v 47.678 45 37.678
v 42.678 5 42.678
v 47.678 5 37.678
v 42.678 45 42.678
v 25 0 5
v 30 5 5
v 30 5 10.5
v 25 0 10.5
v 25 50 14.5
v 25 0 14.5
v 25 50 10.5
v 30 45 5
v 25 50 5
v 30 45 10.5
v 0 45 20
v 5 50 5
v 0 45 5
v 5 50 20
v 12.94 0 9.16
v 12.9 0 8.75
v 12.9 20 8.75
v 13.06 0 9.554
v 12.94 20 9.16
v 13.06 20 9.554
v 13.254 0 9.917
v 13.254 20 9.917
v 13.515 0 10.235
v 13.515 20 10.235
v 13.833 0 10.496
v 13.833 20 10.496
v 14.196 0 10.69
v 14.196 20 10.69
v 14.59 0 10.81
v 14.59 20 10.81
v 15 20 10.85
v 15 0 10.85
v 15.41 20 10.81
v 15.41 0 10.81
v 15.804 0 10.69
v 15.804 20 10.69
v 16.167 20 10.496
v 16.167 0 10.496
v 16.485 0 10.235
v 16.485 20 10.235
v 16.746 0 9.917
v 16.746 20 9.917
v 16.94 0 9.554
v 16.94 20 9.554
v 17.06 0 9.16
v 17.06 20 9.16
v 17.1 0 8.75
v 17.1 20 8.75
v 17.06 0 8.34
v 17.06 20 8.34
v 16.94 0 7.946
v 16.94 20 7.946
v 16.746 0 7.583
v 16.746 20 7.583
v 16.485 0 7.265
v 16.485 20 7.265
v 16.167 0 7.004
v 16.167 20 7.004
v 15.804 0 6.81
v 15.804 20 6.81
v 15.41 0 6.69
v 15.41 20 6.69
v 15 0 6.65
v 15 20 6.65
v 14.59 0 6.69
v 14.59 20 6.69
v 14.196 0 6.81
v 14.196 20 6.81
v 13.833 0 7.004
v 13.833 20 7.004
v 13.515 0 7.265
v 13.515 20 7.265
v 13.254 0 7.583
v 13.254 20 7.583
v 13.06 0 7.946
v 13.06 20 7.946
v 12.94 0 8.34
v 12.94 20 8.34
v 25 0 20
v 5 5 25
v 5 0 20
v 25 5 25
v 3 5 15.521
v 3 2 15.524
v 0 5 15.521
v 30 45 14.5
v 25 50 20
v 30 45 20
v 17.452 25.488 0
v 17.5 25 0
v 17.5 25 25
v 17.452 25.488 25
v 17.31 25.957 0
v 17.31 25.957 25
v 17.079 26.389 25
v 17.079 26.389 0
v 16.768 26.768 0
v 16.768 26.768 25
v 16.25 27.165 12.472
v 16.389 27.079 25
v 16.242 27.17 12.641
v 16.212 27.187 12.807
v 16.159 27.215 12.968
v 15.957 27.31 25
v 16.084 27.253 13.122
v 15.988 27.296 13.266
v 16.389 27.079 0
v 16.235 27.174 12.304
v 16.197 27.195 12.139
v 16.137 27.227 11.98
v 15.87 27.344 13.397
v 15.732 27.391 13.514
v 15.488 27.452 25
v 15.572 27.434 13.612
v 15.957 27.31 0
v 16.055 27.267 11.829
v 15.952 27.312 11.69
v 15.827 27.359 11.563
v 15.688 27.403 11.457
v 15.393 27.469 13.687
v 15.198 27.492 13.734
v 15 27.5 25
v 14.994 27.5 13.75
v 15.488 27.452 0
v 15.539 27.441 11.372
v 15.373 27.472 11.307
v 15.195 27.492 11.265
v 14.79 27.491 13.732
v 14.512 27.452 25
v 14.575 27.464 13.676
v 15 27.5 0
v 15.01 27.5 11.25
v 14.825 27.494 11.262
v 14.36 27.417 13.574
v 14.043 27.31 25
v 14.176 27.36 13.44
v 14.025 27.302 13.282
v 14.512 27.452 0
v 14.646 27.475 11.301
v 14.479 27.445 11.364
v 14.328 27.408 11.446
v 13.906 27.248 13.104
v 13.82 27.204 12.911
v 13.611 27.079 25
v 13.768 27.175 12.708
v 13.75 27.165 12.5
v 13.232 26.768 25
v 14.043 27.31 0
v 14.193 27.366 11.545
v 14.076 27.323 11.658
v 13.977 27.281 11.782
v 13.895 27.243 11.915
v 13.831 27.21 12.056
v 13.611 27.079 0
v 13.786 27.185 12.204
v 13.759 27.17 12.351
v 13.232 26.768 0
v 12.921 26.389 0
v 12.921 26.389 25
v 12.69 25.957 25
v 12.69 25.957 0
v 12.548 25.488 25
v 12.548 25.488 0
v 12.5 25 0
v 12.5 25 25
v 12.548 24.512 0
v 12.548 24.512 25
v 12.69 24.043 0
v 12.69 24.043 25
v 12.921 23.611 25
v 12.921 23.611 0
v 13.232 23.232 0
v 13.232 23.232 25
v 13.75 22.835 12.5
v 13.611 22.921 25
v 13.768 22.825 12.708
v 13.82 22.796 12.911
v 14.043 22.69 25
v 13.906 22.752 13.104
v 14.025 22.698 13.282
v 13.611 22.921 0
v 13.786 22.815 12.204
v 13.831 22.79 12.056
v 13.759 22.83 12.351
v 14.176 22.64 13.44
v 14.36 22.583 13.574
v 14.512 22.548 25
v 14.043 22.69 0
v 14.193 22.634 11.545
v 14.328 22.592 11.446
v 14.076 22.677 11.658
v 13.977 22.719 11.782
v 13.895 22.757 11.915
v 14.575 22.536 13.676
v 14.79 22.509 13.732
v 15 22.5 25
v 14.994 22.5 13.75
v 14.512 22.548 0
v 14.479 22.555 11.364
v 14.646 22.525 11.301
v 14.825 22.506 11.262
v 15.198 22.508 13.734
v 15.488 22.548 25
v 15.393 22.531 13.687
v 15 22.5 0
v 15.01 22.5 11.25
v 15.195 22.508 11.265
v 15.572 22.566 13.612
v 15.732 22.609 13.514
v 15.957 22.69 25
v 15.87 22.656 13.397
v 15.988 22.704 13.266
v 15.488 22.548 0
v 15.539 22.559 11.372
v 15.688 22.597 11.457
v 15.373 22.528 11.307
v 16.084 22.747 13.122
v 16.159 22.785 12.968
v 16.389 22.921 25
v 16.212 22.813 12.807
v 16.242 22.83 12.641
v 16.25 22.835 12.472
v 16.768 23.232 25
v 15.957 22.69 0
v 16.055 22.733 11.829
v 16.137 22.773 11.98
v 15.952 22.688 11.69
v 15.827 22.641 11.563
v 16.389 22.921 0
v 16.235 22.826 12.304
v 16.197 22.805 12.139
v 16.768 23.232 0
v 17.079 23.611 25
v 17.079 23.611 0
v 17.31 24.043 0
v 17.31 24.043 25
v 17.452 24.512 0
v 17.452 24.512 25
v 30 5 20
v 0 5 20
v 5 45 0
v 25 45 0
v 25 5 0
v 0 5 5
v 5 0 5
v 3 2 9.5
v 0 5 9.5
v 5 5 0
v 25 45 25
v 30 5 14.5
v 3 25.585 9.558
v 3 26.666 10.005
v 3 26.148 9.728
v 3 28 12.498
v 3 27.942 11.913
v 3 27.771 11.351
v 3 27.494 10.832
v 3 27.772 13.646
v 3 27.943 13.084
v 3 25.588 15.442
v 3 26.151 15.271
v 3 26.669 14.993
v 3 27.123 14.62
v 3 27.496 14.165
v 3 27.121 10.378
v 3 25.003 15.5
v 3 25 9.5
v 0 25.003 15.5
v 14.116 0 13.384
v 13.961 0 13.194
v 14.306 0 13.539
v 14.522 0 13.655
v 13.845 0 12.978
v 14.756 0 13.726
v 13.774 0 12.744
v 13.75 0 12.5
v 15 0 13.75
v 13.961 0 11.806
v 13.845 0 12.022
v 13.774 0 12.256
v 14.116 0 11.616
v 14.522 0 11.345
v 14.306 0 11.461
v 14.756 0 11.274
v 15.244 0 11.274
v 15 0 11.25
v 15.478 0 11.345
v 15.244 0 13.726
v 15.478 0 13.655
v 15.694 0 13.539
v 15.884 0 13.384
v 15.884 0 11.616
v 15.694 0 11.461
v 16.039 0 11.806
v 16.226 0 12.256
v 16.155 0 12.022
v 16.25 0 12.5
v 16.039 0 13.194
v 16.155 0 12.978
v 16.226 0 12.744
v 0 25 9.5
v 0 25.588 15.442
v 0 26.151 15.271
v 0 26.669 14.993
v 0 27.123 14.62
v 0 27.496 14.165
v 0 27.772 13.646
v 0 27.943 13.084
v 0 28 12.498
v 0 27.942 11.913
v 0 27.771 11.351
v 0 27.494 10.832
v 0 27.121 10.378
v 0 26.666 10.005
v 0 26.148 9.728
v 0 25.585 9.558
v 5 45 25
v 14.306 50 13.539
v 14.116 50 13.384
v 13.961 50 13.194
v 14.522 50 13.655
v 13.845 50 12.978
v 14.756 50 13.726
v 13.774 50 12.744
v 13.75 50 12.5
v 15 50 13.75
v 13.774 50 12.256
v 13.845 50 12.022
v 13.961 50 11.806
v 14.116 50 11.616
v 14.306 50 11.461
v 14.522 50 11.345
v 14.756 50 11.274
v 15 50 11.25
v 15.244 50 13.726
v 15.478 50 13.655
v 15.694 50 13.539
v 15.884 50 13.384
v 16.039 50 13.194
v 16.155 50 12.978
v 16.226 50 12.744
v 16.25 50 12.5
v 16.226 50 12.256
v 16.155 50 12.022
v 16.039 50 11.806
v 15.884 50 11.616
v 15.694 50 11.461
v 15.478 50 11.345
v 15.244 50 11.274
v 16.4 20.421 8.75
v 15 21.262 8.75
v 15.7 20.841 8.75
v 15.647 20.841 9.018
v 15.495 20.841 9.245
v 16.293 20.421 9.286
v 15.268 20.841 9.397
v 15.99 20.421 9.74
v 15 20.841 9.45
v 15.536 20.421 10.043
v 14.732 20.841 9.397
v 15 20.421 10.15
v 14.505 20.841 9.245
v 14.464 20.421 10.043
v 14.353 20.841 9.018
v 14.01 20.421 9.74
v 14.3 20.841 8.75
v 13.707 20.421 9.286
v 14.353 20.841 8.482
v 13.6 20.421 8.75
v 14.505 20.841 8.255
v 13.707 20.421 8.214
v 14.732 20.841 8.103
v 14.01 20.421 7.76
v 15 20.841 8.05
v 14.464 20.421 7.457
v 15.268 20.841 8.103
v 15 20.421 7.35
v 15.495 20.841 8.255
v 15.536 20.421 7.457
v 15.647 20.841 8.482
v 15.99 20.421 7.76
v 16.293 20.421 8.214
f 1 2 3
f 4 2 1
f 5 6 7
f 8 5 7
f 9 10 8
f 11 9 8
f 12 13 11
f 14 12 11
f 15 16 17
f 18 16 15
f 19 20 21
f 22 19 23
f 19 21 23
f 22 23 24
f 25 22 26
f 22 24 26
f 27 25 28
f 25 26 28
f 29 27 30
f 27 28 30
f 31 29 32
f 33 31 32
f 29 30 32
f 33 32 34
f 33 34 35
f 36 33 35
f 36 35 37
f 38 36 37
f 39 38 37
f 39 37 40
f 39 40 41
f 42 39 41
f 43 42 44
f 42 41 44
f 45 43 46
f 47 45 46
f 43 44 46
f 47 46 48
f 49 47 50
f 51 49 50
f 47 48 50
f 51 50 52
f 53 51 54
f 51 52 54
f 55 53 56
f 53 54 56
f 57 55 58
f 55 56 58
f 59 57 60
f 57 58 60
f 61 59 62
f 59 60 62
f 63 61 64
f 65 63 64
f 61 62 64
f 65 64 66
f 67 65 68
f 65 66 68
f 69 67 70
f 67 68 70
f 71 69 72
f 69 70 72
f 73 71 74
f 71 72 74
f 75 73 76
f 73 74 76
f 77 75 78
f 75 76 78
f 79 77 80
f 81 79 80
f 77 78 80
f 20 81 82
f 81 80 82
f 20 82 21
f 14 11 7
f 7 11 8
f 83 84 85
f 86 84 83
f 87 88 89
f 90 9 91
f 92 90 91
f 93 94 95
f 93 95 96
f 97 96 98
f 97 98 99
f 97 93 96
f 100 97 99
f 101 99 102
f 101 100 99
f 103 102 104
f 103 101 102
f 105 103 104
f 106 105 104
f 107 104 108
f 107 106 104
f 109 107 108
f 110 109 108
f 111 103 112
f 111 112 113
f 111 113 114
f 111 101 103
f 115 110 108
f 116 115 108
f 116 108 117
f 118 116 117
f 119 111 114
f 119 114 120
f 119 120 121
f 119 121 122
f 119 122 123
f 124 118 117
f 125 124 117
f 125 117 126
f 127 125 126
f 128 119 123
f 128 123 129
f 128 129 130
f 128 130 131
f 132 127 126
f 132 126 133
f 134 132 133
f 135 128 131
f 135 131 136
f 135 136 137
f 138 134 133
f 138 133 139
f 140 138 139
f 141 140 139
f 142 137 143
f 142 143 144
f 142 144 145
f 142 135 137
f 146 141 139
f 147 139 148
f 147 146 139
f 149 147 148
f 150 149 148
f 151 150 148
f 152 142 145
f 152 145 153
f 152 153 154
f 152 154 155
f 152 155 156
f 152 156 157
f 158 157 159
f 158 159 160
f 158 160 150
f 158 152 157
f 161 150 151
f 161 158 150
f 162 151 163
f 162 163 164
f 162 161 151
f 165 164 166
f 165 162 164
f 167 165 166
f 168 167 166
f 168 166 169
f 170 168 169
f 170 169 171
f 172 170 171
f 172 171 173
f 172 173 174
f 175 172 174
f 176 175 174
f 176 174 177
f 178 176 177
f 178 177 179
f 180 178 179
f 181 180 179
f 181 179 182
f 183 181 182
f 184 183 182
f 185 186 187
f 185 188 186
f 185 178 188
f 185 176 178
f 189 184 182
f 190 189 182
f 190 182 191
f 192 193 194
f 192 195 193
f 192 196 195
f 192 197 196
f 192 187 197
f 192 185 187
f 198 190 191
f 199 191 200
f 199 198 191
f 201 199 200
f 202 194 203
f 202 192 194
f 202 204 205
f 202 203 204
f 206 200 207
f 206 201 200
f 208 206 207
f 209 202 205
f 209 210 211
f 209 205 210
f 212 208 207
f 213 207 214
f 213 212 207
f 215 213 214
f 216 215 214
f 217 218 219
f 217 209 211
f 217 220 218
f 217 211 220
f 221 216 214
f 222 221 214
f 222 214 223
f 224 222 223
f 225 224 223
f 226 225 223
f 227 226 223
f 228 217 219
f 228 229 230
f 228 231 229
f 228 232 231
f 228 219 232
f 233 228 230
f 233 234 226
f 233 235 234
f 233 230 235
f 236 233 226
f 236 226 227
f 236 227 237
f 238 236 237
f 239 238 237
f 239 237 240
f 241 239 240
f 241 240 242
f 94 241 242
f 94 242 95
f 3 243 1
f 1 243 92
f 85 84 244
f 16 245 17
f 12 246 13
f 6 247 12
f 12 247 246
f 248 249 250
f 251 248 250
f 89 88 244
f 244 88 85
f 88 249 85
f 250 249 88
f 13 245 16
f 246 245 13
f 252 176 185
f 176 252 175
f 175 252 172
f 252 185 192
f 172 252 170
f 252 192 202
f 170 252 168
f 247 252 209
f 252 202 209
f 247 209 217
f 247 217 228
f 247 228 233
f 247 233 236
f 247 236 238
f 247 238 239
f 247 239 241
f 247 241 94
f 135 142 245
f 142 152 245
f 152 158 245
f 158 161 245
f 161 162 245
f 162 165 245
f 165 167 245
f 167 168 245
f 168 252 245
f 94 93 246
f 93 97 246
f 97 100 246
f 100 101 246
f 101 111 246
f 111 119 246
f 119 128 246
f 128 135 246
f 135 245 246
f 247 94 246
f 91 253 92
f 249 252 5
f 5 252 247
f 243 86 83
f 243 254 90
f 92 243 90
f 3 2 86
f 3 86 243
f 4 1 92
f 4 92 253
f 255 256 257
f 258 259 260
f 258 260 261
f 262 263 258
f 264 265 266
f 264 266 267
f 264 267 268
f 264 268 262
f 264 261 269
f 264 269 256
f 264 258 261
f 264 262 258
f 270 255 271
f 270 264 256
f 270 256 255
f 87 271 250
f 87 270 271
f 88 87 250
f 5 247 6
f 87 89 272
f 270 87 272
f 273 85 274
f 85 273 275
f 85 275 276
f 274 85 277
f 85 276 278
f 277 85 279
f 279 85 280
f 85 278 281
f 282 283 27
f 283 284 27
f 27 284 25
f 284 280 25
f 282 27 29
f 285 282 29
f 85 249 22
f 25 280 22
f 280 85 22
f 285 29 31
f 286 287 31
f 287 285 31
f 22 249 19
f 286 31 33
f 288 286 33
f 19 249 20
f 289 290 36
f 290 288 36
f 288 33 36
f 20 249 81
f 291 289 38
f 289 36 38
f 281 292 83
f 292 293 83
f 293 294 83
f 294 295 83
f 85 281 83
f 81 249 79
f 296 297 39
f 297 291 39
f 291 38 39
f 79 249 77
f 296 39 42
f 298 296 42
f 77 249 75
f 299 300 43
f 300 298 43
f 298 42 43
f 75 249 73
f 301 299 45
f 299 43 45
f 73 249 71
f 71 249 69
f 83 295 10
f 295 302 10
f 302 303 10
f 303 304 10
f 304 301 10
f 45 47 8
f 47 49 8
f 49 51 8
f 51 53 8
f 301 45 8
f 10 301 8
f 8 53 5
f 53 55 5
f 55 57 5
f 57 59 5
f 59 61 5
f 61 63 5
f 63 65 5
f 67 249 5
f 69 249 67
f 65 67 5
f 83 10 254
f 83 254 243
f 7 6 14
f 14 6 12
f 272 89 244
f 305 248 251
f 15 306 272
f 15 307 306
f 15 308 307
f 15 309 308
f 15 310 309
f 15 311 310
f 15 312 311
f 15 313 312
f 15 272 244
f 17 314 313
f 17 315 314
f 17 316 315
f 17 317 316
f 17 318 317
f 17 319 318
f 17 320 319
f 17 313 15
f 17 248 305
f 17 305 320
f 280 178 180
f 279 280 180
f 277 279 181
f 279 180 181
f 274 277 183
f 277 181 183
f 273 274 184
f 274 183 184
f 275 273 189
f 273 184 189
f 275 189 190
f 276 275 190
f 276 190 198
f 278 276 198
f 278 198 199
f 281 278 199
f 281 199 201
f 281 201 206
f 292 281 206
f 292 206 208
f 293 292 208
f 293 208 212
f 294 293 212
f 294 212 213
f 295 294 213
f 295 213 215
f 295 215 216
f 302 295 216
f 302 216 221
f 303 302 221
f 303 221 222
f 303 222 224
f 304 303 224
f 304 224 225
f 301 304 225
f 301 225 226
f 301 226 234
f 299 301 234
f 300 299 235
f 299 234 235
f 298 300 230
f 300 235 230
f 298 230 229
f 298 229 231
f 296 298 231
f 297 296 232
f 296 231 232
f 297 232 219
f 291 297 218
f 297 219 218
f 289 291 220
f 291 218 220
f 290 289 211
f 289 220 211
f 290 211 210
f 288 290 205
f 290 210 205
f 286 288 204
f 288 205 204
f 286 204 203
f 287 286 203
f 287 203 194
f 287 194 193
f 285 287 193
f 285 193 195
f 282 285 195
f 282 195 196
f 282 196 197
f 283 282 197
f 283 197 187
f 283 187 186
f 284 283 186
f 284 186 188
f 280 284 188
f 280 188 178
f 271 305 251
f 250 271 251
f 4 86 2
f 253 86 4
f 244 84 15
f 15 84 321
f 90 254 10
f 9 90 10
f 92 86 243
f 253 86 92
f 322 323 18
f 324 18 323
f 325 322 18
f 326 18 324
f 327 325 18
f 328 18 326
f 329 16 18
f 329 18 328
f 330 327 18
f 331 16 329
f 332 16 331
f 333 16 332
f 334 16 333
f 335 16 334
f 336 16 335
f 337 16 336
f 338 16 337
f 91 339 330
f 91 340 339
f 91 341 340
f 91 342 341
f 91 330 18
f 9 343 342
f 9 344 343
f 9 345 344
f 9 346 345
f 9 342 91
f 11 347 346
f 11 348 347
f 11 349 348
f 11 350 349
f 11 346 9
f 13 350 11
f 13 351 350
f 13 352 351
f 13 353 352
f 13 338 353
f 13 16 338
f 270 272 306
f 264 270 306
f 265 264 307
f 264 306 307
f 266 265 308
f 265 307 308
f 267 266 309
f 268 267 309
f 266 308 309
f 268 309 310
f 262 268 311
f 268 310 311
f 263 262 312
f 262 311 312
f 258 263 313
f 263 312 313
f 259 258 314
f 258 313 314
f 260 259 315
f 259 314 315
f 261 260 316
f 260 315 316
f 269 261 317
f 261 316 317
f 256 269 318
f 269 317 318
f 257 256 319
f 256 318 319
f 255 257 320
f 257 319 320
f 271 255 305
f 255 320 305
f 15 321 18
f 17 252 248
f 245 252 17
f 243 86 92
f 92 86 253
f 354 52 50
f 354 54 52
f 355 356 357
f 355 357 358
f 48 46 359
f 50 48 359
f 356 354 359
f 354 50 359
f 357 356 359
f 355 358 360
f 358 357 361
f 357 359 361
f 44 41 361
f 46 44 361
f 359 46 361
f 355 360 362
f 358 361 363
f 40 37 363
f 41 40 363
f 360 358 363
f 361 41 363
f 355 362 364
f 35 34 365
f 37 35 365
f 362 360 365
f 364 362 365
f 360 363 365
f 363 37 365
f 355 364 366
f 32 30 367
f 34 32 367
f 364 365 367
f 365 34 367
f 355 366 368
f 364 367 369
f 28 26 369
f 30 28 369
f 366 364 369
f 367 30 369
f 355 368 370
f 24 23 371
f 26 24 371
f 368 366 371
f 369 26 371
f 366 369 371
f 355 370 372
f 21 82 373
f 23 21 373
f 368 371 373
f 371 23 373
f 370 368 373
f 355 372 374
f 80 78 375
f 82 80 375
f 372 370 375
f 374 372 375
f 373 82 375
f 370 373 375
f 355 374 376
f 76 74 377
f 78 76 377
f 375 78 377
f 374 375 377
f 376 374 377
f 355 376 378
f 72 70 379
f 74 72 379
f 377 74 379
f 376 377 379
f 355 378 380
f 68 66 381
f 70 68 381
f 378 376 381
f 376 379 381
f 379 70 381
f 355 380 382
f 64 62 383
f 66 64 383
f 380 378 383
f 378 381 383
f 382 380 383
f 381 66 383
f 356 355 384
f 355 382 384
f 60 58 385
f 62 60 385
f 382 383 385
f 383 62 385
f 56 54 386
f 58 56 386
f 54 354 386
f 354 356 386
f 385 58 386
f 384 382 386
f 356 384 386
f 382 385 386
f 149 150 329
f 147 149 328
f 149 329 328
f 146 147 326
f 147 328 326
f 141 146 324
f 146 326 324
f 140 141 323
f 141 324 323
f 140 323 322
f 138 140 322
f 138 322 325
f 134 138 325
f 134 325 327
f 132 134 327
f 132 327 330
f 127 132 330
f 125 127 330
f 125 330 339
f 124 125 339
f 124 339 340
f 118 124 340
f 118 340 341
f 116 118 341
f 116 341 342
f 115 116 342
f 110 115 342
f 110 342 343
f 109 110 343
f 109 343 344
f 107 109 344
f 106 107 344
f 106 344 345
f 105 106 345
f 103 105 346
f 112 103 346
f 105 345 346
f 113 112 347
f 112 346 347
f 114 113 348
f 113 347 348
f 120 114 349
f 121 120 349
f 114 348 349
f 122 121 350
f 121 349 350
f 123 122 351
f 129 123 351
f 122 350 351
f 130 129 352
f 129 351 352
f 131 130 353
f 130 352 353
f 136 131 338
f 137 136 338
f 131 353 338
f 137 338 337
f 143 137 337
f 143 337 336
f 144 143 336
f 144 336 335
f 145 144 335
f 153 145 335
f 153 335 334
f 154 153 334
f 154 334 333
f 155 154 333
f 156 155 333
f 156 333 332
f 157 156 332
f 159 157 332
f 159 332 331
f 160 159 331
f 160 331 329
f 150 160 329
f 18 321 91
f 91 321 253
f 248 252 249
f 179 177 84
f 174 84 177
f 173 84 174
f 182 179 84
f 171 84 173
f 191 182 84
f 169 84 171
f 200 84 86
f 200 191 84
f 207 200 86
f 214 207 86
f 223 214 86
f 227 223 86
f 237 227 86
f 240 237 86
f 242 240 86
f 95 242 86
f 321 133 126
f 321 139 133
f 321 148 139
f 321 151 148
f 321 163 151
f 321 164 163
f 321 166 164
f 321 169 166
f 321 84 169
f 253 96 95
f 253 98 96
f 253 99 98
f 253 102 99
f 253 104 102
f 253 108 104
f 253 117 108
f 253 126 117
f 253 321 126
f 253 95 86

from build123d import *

# Parameters (mm, degrees)
F0_W     = 30
F0_H     = 50
F0_R     = 2.5
F1_DEPTH = 25
F2_SIZE  = 5
F4_DEPTH = 63.1
F6_DEPTH = 3
F8_D     = 4.2
F8_DEPTH = 20
F8_TIP   = 1.2618073
F9_DEPTH = 25
F11_D    = 2.5


with BuildPart() as f1:
    # F0 (on Top) → F1 (new body)
    with BuildSketch(Plane.XY):
        with Locations((15, 25)):
            Rectangle(F0_W, F0_H)
        with Locations((15, 25)):
            Circle(F0_R, mode=Mode.SUBTRACT)
    extrude(amount=F1_DEPTH)

    # F2
    f2_edges = [f1.edges().sort_by_distance(p)[0] for p in [
        (15, 50, 25),
        (30, 25, 25),
        (15, 0, 25),
        (0, 25, 25),
        (30, 25, 0),
        (15, 50, 0),
        (0, 25, 0),
        (15, 0, 0),
        (0, 0, 12.5),
        (30, 0, 12.5),
        (30, 50, 12.5),
        (0, 50, 12.5),
    ]]
    chamfer(f2_edges, length=F2_SIZE)

    # F3 (on face) → F4 (cut)
    with BuildSketch(Plane.XZ):
        Polygon((25, 14.5), (25, 12.5), (25, 10.5), (32.3230884969, 10.5), (32.3230884969, 14.5), align=None)
    extrude(amount=-F4_DEPTH, mode=Mode.SUBTRACT)

    # F5 (on face) → F6 (cut)
    with BuildSketch(Plane(origin=(0, 0, 0), x_dir=(0, -1, 0), z_dir=(-1, 0, 0))):
        with BuildLine():
            Line((-5, 15.5206739136), (-25.003100845, 15.4999983975))
            ThreePointArc((-25.003100845, 15.4999983975), (-27.9999995994, 12.4984495773), (-25, 9.5))
            Line((-25, 9.5), (-5, 9.5))
            Line((-5, 9.5), (-5, 15.5206739136))
        make_face()
        Polygon((7.2839763969, 15.5333708226), (-5, 15.5206739136), (-5, 9.5), (7.2839763969, 9.5), align=None)
    extrude(amount=-F6_DEPTH, mode=Mode.SUBTRACT)

    # F8
    with Locations(Plane.XZ):
        with Locations((15, 8.75)):
            Hole(F8_D / 2, depth=F8_DEPTH)
            with Locations((0, 0, -(F8_DEPTH + F8_TIP / 2))):  # 118° drill point
                Cone(0, F8_D / 2, F8_TIP, mode=Mode.SUBTRACT)


with BuildPart() as f9:
    # F9 (new): a face of the model
    f9_faces = [f1.part.faces().sort_by_distance(p)[0] for p in [
        (27.5, 25, 22.5),
    ]]
    extrude(f9_faces, amount=F9_DEPTH)


with BuildPart() as f1_1:
    add(f1.part)

    # F11 (through all)
    with Locations(Plane.XZ):
        with Locations((15, 12.5)):
            Hole(F11_D / 2)


solid = Compound([f9.part, f1_1.part])
